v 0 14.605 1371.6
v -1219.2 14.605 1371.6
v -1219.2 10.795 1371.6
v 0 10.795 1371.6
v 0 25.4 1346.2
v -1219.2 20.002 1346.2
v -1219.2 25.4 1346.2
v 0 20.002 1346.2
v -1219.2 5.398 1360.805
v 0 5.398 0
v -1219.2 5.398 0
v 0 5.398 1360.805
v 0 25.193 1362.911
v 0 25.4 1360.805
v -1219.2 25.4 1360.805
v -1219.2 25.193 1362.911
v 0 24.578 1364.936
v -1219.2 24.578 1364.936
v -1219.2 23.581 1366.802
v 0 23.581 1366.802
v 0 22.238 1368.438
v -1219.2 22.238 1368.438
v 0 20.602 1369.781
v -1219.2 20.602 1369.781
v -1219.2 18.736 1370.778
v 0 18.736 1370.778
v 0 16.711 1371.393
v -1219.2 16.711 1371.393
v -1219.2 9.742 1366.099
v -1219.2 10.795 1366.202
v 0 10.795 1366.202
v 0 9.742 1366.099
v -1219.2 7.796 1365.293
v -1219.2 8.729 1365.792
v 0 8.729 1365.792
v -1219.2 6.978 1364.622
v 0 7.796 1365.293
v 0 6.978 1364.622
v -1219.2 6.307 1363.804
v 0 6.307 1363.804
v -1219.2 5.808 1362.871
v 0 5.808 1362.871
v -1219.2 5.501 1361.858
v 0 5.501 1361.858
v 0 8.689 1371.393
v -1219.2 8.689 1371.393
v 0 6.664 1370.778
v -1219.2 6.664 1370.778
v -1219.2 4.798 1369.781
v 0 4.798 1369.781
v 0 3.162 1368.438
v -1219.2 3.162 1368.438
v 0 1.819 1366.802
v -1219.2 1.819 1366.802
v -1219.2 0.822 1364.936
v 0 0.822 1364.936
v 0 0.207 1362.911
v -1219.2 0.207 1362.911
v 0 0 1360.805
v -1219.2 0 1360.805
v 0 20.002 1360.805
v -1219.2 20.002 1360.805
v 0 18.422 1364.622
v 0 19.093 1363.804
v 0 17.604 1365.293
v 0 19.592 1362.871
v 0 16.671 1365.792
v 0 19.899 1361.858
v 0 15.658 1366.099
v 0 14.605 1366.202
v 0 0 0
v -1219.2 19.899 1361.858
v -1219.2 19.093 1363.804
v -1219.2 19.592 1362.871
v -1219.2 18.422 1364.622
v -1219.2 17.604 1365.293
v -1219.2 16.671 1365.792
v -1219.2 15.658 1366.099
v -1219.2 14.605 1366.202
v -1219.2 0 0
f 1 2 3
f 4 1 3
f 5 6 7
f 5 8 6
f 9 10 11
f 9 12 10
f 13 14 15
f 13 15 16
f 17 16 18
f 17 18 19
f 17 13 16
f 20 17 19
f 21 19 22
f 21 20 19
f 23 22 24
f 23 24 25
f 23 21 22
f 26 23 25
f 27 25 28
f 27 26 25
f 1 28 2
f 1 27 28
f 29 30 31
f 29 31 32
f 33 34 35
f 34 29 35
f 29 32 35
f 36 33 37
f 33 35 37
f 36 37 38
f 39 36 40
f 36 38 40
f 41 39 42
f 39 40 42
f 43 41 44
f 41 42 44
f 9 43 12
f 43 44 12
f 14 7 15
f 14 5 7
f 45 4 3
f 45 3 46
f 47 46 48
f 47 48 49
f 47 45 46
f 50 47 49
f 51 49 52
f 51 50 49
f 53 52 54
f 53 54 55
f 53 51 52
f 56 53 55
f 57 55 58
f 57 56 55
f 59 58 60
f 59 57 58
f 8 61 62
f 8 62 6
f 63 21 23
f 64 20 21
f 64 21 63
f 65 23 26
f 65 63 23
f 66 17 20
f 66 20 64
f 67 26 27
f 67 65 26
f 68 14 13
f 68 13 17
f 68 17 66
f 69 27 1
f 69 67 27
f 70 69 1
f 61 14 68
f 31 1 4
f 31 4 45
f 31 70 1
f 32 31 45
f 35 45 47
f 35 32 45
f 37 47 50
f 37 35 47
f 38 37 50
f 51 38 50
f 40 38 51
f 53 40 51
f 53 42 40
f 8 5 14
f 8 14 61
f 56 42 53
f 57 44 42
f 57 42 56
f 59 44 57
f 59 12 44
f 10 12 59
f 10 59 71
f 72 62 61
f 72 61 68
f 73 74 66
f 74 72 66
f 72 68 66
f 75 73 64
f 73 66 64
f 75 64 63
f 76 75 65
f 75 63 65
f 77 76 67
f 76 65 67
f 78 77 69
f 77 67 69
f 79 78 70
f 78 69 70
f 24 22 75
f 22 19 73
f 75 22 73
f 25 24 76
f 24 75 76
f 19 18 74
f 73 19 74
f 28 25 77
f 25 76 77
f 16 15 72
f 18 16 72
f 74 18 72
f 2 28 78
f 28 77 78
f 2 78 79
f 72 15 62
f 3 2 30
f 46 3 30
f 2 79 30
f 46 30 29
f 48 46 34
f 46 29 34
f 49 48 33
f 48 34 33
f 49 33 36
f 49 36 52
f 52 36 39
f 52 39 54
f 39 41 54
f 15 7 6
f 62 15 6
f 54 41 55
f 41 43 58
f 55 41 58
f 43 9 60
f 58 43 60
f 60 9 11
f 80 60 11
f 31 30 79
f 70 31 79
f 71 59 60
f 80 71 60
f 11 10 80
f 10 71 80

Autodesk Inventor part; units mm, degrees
ref_plane "YZ Plane" through (0, 0, 0) normal (1, 0, 0) x (0, 1, 0)
ref_plane "XZ Plane" through (0, 0, 0) normal (0, 1, 0) x (-1, 0, 0)
ref_plane "XY Plane" through (0, 0, 0) normal (0, 0, 1) x (1, 0, 0)
sketch "Sketch1" plane through (0, 0, 0) normal (0, 1, 0) x (-1, 0, 0)
  line L0 (0, 0) -> (1219.2, 0)
  line L1 (1219.2, 0) -> (1219.2, 1371.6)
  line L2 (1219.2, 1371.6) -> (0, 1371.6)
  line L3 (0, 1371.6) -> (0, 0)
  dimension "d0" = 1219.2
  dimension "d1" = 1371.6
extrude "Plate1" add sketch "Sketch1" along normal blind 5.3975
sketch "Sketch2" plane through (0, 0, 1366.2025) normal (0, 0, 1) x (1, 0, 0)
  line L0 (-1219.2, 0) -> (0, 0)
  line L1 (0, 0) -> (0, 25.4)
  line L2 (0, 25.4) -> (-1219.2, 25.4)
  line L3 (-1219.2, 25.4) -> (-1219.2, 0)
edge flange "Flange1" height 25.4 angle 90 thickness 5.3975 bend radius 5.3975 thickness toward (0, 0, 1) relief tear relief width 5.3975 relief depth 2.6987 edges at (-609.6, 5.3975, 1371.6) wall of the first edge with corners at (-1219.2, 0, 1366.2025) (0, 0, 1366.2025) (0, 25.4, 1366.2025) (-1219.2, 25.4, 1366.2025)
bend "Bend1"
corner "Corner1"
sketch "Sketch3" plane through (0, 20.0025, 1371.6) normal (0, 1, 0) x (-1, 0, 0)
  line L0 (1219.2, 0) -> (0, 0)
  line L1 (0, 0) -> (0, -25.4)
  line L2 (0, -25.4) -> (1219.2, -25.4)
  line L3 (1219.2, -25.4) -> (1219.2, 0)
edge flange "Flange2" height 25.4 angle 90 thickness 5.3975 bend radius 5.3975 thickness toward (0, 1, 0) relief tear relief width 5.3975 relief depth 2.6987 edges at (-609.6, 25.4, 1366.2025) wall of the first edge with corners at (-1219.2, 20.0025, 1371.6) (0, 20.0025, 1371.6) (0, 20.0025, 1346.2) (-1219.2, 20.0025, 1346.2)
bend "Bend2"
corner "Corner2"
equation "\"d3\" = BendReliefWidth"
equation "\"d4\" = BendReliefDepth"
equation "\"d5\" = MinimumRemnant"
equation "\"d6\" = BendRadius"
equation "\"d9\" = BendRadius"
equation "\"d10\" = CornerReliefSize"
equation "\"d11\" = GapSize"
equation "\"d12\" = JacobiRadiusSize"
equation "\"d13\" = BendReliefWidth"
equation "\"d14\" = BendReliefDepth"
equation "\"d15\" = MinimumRemnant"
equation "\"d16\" = BendRadius"
equation "\"d19\" = BendRadius"
equation "\"d20\" = CornerReliefSize"
equation "\"d21\" = GapSize"
equation "\"d22\" = JacobiRadiusSize"
equation "\"BendRadius\" = Thickness"
equation "\"BendReliefWidth\" = Thickness"
equation "\"BendReliefDepth\" = 0.5 * Thickness"
equation "\"CornerReliefSize\" = 4 * Thickness"
equation "\"MinimumRemnant\" = 2 * Thickness"
equation "\"TransitionRadius\" = BendRadius"
equation "\"JacobiRadiusSize\" = BendRadius"
equation "\"GapSize\" = Thickness"
equation "\"d2\" = BendRadius"
equation "\"Thickness\" = 5.3975"
properties part number "wall-side" material "Polycarbonate, Clear"
